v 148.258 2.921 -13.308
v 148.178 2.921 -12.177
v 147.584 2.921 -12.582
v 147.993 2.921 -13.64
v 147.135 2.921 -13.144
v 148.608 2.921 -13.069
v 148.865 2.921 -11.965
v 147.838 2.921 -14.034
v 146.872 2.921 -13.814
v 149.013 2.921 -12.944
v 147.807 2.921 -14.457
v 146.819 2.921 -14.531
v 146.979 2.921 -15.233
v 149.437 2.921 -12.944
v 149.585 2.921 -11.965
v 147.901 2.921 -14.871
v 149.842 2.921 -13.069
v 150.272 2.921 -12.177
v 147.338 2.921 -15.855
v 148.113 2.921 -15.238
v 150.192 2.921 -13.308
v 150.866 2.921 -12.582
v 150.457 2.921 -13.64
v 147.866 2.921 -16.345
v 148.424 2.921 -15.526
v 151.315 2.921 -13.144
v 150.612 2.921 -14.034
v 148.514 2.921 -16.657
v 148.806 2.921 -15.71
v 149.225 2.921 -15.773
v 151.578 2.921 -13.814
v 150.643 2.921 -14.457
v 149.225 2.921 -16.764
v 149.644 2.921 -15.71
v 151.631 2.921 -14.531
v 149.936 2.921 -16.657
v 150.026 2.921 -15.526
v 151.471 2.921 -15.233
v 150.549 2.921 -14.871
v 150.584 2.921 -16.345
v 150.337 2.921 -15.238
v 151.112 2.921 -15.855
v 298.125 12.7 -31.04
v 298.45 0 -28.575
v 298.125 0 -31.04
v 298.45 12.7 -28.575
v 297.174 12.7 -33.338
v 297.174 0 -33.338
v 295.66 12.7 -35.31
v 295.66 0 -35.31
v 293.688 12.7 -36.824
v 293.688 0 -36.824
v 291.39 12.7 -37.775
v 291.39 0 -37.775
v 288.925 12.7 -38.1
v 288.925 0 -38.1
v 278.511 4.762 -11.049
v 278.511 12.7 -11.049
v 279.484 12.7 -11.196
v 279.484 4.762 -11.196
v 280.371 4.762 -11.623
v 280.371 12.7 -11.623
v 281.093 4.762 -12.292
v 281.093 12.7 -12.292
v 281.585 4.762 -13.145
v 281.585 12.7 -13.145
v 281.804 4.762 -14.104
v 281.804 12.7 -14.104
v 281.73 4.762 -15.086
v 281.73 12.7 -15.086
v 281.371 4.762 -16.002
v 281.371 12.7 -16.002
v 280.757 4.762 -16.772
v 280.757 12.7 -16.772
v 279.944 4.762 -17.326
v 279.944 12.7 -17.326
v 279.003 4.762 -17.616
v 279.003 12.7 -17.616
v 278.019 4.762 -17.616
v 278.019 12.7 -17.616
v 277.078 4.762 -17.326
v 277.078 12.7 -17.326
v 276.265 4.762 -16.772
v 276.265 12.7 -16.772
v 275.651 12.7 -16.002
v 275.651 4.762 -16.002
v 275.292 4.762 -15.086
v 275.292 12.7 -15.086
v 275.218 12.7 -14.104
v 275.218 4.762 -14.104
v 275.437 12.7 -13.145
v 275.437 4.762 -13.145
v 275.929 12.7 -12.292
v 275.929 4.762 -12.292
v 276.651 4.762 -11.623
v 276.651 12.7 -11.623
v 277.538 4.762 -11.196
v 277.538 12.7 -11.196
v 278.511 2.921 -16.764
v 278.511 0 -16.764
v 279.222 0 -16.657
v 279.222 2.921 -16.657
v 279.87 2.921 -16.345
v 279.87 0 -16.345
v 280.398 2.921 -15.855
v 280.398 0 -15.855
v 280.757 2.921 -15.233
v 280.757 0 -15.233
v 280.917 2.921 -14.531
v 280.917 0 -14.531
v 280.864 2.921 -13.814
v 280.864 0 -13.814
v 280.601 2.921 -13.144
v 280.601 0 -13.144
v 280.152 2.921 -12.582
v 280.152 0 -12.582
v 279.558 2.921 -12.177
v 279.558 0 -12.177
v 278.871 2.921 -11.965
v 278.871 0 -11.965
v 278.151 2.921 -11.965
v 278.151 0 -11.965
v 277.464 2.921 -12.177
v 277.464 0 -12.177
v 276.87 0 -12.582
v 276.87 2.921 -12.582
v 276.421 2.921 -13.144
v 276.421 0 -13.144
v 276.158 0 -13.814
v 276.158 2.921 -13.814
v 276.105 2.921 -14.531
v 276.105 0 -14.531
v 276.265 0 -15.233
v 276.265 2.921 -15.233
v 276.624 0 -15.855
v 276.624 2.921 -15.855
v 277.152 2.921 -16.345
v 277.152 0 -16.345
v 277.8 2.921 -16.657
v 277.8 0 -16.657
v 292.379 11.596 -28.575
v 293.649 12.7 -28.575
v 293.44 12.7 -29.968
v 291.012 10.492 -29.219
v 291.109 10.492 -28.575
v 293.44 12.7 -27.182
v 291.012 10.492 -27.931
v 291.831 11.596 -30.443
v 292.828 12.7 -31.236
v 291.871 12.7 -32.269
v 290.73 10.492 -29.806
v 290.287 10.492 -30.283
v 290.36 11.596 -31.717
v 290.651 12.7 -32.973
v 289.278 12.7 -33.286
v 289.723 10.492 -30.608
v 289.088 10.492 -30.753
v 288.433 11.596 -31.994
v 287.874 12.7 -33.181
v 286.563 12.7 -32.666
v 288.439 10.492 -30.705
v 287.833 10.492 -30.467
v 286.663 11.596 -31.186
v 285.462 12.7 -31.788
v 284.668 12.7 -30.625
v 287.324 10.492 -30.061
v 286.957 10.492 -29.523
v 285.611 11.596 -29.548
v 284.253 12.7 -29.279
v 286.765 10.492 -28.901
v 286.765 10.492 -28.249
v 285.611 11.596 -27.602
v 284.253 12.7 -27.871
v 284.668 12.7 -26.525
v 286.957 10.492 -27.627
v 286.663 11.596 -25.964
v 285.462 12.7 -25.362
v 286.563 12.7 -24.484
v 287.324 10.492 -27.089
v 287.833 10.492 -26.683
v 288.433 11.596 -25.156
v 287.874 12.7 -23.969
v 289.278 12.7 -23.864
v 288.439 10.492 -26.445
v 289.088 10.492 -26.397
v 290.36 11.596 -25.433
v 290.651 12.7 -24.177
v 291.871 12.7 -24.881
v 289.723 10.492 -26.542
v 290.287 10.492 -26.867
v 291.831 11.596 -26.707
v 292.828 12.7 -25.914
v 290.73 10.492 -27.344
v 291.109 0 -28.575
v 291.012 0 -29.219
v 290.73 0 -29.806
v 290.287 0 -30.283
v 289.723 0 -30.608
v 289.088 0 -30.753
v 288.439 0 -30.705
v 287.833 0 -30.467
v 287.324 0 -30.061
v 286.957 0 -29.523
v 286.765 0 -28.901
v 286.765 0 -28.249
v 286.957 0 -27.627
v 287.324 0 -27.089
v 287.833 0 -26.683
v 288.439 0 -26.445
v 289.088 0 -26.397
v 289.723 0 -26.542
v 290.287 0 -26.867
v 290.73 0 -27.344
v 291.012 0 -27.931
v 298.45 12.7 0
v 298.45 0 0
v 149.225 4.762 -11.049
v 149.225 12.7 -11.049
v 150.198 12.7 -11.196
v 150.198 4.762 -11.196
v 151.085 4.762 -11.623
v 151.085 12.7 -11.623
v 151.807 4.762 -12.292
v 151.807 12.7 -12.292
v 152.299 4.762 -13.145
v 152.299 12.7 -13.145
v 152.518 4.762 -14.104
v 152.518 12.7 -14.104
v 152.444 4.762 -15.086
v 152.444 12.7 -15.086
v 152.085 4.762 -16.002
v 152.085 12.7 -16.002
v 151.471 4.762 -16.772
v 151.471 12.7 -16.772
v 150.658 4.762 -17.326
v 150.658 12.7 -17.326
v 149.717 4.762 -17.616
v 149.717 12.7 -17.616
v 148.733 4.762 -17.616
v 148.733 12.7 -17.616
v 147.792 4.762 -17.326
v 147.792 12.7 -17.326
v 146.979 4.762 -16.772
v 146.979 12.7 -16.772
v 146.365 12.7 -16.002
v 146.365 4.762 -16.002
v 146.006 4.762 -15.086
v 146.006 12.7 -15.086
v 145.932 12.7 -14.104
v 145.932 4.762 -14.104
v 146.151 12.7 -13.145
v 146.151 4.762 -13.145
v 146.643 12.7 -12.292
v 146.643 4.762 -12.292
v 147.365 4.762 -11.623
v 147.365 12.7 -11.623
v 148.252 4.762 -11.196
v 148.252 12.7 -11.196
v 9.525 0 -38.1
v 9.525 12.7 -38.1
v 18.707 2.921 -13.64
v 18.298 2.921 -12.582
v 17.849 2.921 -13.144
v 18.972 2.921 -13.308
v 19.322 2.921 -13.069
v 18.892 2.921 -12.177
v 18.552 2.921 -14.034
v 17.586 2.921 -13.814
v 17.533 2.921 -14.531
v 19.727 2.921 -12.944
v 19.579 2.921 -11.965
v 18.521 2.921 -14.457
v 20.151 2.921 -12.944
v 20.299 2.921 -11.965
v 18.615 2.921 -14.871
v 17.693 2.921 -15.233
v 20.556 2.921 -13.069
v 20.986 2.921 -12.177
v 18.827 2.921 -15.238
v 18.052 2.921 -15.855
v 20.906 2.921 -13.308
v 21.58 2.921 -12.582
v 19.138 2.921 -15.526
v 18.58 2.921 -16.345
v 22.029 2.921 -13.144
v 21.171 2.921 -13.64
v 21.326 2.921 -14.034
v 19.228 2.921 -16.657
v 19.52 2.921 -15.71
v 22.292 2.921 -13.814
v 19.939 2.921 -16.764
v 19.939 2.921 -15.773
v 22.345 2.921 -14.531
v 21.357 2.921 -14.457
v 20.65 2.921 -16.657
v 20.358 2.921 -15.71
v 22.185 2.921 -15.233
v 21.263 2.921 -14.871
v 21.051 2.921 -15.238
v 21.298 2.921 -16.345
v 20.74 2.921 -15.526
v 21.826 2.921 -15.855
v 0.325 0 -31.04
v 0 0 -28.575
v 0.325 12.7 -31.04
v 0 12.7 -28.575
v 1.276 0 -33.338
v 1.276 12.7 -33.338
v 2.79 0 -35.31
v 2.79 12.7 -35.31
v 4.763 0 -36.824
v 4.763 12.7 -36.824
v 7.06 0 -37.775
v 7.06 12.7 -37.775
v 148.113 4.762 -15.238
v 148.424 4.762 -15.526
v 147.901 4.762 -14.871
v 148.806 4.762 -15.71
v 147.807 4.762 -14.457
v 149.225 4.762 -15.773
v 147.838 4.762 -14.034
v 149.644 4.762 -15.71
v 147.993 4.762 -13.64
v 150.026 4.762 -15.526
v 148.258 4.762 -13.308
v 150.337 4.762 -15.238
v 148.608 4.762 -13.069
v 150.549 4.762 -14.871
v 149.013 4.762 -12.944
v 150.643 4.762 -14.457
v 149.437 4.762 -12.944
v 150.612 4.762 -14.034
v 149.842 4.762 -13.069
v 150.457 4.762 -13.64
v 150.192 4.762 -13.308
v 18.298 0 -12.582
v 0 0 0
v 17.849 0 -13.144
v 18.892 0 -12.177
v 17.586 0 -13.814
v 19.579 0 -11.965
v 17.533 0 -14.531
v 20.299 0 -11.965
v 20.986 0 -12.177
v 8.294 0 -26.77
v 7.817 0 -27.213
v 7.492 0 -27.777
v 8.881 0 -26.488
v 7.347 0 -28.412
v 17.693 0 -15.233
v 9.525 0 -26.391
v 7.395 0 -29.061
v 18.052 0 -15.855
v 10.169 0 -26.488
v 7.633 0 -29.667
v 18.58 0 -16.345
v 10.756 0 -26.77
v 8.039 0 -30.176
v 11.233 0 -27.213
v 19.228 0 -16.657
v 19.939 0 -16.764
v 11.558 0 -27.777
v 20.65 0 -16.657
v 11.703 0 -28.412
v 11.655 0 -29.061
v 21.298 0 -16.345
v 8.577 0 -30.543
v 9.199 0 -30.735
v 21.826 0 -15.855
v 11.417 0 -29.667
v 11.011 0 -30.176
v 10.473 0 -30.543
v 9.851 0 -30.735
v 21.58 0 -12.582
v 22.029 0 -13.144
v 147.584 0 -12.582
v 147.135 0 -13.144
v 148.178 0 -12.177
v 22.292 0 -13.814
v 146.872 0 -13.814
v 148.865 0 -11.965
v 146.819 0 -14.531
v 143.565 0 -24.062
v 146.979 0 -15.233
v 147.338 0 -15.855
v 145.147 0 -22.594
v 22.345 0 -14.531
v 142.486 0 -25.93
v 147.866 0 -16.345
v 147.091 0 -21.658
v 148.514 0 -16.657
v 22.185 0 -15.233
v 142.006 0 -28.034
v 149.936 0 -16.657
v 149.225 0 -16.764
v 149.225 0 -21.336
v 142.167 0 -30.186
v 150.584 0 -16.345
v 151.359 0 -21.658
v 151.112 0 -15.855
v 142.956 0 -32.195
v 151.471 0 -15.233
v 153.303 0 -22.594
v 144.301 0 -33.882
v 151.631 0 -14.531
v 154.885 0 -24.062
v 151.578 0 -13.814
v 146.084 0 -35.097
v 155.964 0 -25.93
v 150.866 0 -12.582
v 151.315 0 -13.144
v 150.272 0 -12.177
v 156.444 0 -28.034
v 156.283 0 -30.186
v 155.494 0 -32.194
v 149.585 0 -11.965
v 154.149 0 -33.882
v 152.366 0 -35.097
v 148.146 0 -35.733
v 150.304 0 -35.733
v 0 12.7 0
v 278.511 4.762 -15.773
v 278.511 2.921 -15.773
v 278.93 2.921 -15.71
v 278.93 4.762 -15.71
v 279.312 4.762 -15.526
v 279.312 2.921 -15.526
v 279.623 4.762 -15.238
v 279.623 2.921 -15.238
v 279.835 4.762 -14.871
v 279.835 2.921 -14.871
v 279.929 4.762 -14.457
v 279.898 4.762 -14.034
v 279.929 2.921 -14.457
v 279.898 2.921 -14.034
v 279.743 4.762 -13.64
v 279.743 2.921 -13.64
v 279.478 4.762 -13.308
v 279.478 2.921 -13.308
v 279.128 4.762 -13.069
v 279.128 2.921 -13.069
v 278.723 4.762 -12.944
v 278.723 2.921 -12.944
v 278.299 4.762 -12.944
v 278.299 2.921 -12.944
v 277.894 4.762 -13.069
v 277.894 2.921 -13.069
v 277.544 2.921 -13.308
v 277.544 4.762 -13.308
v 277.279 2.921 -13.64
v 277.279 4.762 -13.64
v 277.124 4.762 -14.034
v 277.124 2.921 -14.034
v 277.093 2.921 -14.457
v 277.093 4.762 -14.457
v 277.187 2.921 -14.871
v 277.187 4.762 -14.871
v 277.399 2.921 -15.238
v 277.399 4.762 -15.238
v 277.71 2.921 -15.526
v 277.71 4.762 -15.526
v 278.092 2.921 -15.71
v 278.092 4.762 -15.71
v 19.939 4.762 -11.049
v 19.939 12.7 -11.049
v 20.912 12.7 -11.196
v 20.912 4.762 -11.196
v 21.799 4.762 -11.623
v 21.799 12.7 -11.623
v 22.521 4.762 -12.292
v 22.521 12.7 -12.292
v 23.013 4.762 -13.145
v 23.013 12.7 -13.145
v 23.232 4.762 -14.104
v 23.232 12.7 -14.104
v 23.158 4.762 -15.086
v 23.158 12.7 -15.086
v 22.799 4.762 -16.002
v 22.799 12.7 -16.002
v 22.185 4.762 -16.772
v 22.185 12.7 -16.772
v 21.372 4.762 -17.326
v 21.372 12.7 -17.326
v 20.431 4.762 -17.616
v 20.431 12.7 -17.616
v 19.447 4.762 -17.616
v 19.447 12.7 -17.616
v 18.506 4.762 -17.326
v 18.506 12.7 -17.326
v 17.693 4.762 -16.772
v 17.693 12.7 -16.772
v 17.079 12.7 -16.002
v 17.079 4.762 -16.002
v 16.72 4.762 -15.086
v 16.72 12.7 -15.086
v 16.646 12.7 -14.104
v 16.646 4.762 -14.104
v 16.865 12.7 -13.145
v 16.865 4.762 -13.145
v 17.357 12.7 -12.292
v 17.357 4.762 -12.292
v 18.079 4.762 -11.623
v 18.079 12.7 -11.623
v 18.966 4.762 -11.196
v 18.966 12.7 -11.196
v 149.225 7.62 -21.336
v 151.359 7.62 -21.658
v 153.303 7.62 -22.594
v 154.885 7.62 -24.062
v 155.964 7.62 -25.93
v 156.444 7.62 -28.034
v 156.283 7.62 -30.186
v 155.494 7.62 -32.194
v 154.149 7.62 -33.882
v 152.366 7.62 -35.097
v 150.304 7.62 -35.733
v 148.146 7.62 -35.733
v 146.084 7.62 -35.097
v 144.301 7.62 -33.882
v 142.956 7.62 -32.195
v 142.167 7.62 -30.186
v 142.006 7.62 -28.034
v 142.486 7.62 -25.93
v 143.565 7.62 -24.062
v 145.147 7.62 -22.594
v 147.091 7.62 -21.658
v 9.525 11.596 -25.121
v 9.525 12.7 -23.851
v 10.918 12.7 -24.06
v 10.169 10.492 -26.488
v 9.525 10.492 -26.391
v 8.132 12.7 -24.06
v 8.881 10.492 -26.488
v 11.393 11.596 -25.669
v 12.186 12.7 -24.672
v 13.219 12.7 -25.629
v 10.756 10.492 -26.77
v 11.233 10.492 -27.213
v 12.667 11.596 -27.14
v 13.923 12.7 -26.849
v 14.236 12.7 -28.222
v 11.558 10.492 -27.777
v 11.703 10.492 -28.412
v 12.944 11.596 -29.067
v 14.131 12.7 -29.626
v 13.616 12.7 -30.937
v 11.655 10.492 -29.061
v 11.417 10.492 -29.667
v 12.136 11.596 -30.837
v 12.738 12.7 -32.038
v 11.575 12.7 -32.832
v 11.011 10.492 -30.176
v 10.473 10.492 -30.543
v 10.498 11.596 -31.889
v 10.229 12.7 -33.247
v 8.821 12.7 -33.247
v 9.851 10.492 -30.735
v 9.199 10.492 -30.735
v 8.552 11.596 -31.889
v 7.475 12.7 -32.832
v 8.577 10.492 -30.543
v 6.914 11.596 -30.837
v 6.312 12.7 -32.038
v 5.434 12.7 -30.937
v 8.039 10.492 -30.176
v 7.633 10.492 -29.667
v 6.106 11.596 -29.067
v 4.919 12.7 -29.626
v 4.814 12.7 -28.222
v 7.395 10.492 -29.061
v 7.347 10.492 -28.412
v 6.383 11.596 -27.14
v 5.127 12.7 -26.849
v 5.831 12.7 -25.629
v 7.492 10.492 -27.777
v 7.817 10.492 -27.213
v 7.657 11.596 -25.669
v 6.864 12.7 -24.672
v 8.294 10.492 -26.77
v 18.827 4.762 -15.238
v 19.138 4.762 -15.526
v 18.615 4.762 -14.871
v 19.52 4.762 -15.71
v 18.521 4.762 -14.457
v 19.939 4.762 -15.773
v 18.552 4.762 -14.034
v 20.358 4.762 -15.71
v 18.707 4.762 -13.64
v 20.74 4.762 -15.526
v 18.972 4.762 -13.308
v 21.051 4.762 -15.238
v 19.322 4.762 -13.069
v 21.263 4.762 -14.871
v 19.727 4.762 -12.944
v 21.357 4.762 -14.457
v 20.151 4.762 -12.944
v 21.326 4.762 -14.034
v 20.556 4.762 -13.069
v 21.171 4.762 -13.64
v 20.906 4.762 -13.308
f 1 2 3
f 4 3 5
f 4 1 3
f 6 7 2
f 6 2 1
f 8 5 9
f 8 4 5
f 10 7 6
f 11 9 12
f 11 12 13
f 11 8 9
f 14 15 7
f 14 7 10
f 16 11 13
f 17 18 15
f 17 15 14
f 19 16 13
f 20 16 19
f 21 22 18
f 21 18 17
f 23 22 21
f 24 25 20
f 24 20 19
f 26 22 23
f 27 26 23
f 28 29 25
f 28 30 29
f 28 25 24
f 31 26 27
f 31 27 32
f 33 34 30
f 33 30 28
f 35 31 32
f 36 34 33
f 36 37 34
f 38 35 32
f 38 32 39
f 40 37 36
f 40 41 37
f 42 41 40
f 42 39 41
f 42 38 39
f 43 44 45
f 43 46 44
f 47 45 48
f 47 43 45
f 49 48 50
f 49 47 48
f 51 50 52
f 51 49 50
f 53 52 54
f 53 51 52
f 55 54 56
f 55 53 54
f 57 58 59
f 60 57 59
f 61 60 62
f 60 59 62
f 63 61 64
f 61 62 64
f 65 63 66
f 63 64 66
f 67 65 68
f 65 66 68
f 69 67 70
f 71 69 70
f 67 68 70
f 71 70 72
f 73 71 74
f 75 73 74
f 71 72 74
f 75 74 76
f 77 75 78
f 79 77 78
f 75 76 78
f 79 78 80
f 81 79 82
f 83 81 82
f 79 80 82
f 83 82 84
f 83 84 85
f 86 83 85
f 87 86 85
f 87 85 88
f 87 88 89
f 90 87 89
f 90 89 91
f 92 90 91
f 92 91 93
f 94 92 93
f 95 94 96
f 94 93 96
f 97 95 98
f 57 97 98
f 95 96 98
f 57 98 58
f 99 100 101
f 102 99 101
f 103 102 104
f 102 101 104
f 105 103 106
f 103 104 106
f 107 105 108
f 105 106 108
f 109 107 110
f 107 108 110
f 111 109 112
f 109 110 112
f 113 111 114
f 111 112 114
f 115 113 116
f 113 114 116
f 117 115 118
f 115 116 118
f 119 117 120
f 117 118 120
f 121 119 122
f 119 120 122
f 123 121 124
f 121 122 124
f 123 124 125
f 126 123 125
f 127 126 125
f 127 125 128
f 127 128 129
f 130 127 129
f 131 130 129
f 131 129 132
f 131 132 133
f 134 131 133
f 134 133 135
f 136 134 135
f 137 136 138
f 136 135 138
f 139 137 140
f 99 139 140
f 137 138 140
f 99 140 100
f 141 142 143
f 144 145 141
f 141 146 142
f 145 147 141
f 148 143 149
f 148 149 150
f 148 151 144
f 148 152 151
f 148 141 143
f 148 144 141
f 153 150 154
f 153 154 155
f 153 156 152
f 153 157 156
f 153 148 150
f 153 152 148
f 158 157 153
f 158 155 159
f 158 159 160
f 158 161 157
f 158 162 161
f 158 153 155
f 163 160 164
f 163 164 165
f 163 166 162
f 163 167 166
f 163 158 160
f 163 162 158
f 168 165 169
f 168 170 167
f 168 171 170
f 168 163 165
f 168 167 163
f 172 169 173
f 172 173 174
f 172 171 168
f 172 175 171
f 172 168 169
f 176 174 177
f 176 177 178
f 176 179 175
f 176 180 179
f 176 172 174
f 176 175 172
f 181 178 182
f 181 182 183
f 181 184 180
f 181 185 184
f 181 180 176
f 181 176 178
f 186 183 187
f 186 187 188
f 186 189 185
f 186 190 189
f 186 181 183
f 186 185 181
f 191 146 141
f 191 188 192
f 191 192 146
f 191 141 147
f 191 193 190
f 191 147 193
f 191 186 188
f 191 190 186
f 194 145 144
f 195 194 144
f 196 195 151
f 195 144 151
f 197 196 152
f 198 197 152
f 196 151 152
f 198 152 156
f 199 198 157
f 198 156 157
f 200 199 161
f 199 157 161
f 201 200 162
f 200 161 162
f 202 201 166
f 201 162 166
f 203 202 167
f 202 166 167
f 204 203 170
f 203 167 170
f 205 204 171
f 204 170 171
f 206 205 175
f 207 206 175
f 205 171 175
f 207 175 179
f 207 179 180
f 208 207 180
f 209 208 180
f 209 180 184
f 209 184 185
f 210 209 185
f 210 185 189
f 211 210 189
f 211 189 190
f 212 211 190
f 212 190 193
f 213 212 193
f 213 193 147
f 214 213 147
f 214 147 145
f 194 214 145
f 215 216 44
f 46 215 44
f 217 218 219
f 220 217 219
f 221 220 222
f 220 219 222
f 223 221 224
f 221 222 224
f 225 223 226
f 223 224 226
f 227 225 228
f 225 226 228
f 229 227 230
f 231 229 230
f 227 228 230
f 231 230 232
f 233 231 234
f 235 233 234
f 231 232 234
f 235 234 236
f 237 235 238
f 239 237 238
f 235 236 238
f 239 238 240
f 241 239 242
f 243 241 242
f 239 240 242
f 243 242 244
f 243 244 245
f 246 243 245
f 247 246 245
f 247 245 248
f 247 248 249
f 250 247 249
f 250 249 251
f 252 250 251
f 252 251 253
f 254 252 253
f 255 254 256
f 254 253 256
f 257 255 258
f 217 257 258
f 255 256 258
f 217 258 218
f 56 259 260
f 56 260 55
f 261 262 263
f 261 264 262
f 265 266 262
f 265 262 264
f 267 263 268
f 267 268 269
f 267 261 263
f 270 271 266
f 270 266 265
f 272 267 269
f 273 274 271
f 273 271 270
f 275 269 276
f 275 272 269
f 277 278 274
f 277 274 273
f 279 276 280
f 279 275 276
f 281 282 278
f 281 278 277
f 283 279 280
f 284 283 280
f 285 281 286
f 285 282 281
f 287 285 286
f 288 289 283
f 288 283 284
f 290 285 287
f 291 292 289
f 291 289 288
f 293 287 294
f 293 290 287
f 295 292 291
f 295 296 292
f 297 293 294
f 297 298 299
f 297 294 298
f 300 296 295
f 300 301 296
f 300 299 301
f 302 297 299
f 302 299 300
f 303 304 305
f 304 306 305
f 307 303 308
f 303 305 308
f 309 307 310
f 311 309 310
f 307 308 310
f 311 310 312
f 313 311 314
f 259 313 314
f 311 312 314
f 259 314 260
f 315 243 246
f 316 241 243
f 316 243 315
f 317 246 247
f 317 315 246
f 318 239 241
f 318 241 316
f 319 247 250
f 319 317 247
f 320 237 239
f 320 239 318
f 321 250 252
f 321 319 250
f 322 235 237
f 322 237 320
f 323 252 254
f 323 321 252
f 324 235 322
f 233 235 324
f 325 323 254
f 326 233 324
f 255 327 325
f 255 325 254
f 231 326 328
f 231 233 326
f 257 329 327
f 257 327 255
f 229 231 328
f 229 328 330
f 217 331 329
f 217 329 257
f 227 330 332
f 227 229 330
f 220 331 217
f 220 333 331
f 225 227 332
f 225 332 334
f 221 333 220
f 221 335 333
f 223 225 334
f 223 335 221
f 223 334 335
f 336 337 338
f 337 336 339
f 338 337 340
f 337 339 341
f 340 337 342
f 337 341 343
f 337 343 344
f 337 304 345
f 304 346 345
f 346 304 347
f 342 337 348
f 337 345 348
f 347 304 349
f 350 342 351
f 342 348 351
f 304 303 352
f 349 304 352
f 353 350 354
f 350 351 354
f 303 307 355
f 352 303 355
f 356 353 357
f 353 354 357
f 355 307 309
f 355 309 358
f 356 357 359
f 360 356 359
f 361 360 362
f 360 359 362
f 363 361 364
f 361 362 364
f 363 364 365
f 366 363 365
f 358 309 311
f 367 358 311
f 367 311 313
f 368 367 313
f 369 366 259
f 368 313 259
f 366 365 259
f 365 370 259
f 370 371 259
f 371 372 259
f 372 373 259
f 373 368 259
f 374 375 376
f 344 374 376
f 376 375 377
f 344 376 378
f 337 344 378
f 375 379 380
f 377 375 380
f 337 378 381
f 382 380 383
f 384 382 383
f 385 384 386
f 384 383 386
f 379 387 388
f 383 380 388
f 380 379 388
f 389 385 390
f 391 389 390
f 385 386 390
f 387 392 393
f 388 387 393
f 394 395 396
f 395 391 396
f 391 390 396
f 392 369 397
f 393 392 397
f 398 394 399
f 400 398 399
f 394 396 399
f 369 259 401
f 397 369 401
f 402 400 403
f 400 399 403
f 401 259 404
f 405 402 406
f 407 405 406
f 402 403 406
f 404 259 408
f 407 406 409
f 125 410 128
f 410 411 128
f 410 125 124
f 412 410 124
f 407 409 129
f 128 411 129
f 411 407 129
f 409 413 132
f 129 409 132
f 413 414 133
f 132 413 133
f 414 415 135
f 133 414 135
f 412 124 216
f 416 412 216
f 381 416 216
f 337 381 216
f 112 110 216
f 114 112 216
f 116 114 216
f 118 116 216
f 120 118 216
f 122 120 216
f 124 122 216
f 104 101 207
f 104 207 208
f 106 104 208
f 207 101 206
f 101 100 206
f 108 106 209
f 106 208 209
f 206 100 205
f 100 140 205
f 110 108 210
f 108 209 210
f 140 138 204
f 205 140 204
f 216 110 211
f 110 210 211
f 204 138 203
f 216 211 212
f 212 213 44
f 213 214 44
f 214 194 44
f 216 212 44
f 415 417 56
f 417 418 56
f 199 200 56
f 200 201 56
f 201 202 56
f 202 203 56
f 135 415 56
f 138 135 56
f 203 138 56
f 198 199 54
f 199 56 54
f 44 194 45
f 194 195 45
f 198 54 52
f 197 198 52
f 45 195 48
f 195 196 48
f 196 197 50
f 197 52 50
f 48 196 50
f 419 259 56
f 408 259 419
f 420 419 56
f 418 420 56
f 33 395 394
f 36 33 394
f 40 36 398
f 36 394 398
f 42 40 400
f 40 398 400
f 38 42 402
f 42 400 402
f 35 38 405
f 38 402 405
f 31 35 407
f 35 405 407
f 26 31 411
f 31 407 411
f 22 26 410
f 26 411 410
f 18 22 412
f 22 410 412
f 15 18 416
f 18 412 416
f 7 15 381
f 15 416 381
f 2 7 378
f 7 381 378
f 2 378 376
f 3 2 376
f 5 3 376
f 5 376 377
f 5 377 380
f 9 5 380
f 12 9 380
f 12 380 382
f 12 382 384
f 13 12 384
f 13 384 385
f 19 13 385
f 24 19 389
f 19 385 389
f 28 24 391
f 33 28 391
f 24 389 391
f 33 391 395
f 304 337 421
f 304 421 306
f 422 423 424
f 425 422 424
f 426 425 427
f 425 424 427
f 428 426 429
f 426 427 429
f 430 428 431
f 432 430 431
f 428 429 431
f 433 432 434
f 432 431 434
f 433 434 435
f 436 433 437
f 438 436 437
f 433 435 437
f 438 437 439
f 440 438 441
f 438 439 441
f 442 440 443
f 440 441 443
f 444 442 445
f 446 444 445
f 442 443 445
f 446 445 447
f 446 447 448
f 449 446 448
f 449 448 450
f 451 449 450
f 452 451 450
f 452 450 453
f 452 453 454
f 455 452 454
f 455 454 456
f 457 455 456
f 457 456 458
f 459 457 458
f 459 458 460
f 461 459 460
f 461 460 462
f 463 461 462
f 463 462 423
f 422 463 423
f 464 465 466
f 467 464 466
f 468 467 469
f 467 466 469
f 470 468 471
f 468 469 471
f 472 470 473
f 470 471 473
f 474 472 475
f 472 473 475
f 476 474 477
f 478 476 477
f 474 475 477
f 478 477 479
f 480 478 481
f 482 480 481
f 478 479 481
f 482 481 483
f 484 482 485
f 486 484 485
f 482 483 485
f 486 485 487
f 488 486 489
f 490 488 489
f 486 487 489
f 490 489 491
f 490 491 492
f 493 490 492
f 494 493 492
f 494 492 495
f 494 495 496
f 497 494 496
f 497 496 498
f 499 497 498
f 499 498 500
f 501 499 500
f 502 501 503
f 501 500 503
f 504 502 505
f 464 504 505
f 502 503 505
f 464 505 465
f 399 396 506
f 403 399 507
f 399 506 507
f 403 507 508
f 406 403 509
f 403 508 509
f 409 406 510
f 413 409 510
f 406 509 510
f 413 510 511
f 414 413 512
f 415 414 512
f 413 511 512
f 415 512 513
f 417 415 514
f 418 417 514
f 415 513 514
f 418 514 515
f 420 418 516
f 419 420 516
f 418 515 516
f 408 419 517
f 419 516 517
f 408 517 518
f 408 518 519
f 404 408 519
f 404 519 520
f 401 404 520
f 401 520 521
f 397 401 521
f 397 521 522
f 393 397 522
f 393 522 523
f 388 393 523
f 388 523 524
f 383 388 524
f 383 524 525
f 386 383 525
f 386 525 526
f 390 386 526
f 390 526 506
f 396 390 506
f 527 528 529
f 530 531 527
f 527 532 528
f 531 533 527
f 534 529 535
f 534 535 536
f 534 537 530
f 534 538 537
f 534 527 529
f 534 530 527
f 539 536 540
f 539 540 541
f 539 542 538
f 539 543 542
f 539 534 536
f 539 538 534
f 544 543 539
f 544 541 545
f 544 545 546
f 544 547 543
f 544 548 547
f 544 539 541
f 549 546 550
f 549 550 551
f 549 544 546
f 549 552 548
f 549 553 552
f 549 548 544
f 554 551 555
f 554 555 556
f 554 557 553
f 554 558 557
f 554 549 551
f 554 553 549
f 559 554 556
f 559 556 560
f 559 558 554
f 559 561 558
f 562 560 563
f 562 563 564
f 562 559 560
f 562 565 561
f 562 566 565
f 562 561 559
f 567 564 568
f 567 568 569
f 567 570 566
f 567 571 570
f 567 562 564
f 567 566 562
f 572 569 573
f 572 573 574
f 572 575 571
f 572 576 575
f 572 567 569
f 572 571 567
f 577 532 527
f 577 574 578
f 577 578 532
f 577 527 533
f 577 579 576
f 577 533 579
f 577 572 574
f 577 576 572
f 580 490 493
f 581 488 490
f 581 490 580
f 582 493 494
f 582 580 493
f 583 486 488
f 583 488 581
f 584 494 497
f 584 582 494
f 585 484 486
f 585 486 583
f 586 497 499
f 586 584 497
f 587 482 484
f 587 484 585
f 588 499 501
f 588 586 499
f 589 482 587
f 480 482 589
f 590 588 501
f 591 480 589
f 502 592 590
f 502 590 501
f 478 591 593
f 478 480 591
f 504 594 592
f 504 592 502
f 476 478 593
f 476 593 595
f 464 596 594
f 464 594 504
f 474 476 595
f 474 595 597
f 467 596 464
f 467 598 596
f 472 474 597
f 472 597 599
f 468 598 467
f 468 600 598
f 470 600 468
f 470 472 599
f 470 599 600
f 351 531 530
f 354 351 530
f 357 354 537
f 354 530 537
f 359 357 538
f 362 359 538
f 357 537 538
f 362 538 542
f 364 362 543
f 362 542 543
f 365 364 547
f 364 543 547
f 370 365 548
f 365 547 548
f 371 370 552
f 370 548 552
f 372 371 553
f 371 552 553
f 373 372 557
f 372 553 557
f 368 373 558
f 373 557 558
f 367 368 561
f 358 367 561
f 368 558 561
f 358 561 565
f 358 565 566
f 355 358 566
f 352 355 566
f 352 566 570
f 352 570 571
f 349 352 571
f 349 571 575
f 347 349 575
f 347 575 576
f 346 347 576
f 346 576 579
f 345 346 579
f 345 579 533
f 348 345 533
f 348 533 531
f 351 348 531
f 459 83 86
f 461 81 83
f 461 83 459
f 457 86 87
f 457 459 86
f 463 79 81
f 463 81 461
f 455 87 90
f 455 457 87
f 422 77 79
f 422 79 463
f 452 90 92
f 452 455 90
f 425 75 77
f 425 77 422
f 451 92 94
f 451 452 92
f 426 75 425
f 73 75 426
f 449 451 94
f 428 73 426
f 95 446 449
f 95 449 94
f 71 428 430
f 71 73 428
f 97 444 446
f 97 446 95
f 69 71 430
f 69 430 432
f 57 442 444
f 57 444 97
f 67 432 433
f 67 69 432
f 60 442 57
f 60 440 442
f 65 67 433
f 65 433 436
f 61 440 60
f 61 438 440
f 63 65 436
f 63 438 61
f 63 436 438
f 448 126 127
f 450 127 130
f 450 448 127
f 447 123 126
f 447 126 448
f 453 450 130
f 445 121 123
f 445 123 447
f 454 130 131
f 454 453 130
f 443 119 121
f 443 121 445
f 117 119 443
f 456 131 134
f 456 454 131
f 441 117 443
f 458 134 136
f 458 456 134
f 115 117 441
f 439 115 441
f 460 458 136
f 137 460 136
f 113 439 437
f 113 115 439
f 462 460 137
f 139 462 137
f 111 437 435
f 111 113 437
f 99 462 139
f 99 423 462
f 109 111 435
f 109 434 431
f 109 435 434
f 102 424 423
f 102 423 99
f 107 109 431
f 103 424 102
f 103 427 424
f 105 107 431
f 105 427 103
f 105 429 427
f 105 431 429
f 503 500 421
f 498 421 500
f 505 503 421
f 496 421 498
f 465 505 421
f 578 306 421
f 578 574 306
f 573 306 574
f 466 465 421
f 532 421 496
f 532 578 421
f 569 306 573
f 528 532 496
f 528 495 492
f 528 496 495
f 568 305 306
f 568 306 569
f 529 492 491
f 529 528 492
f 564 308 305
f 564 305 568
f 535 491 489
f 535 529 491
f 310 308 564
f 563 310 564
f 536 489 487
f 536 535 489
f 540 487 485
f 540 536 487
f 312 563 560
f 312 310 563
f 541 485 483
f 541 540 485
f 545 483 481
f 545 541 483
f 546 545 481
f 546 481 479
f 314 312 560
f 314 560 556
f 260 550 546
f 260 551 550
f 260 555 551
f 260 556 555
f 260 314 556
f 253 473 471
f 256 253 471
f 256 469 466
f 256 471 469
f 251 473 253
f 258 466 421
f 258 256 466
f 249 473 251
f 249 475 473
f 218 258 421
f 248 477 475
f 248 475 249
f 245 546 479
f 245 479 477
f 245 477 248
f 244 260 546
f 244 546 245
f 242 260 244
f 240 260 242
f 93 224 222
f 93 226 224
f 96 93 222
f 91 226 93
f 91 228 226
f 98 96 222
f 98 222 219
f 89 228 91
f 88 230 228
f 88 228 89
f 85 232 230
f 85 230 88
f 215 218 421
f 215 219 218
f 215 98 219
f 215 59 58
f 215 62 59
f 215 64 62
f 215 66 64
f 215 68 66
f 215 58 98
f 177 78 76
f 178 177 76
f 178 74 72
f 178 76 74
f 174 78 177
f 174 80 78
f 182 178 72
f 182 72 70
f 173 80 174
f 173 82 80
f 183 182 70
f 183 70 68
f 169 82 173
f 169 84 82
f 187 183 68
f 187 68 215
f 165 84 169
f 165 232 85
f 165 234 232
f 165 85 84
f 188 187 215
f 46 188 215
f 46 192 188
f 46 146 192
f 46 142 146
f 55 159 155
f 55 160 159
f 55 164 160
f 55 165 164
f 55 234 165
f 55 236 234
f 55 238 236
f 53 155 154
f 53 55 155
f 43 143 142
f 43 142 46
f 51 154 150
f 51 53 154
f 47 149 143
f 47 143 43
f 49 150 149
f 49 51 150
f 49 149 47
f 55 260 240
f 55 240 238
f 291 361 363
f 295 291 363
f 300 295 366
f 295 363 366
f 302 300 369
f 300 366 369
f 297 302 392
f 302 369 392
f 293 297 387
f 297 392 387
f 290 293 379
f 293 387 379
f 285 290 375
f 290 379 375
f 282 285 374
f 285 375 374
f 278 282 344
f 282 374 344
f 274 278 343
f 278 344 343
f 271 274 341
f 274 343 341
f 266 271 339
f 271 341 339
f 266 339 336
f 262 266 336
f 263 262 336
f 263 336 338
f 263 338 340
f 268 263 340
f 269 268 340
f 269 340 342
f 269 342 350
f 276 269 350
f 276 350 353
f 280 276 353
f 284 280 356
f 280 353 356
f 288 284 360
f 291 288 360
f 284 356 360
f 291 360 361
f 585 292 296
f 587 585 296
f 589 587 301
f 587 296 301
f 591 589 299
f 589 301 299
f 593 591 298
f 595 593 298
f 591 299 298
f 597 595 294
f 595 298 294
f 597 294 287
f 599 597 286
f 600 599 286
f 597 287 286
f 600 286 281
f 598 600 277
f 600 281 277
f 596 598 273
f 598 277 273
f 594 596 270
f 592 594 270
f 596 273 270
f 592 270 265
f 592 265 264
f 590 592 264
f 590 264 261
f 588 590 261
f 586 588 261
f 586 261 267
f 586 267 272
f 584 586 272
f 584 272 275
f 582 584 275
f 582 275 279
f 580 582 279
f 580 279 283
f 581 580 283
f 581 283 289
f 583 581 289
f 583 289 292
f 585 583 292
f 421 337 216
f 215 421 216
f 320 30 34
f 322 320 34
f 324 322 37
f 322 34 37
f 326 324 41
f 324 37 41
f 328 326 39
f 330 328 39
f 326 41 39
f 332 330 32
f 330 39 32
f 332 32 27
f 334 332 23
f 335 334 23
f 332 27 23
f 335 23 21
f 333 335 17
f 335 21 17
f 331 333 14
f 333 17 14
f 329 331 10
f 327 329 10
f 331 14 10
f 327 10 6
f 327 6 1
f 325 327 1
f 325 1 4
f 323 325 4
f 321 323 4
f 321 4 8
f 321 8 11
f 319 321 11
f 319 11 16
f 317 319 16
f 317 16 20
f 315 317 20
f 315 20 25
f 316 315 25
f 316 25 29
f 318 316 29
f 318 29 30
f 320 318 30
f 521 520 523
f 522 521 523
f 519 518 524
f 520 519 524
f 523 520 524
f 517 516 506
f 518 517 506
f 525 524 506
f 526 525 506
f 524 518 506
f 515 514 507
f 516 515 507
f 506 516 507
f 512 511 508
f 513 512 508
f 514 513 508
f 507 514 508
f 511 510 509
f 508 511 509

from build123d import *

# Parameters (mm, degrees)
SKETCH1_W           = 298.45
SKETCH1_H           = 38.1
BOSS_EXTRUDE1_DEPTH = 12.7
FILLET1_R           = 9.525
SKETCH2_R           = 3.302
CUT_EXTRUDE1_DEPTH  = 7.9375
SKETCH4_R           = 1.4224
CUT_EXTRUDE2_DEPTH  = 302.140004815
SKETCH5_R           = 2.413
CUT_EXTRUDE3_DEPTH  = 2.921
SKETCH6_R           = 2.1844
CUT_EXTRUDE4_DEPTH  = 302.140004815
CHAMFER1_SIZE       = 2.54
CHAMFER1_SIZE2      = 2.207988314
CUT_EXTRUDE5_START  = -5.08
SKETCH7_R           = 7.239
CUT_EXTRUDE5_DEPTH  = 297.060004815


with BuildPart() as part:
    # Sketch1 → Boss-Extrude1 (new body)
    with BuildSketch(Plane(origin=(0, 0, 0), x_dir=(1, 0, 0), z_dir=(0, 1, 0))):
        with Locations((149.225, 19.05)):
            Rectangle(SKETCH1_W, SKETCH1_H)
    extrude(amount=BOSS_EXTRUDE1_DEPTH)

    # Fillet1
    fillet1_edges = [part.edges().sort_by_distance(p)[0] for p in [
        (0, 6.35, -38.1),
        (298.45, 6.35, -38.1),
    ]]
    fillet(fillet1_edges, radius=FILLET1_R)

    # Sketch2 → Cut-Extrude1 (cut)
    with BuildSketch(Plane(origin=(0, 12.7, 0), x_dir=(1, 0, 0), z_dir=(0, 1, 0))):
        with Locations(Location((19.939, 14.351, 0), (0, 0, 270))):
            Circle(SKETCH2_R)
        with Locations(Location((149.225, 14.351, 0), (0, 0, 270))):
            Circle(SKETCH2_R)
        with Locations(Location((278.511, 14.351, 0), (0, 0, 270))):
            Circle(SKETCH2_R)
    extrude(amount=-CUT_EXTRUDE1_DEPTH, mode=Mode.SUBTRACT)

    # Sketch4 → Cut-Extrude2 (cut, through all)
    with BuildSketch(Plane.XZ):
        with Locations(Location((19.939, -14.351, 0), (0, 0, 270))):
            Circle(SKETCH4_R)
        with Locations(Location((149.225, -14.351, 0), (0, 0, 270))):
            Circle(SKETCH4_R)
        with Locations(Location((278.511, -14.351, 0), (0, 0, 270))):
            Circle(SKETCH4_R)
    extrude(amount=-CUT_EXTRUDE2_DEPTH, mode=Mode.SUBTRACT)

    # Sketch5 → Cut-Extrude3 (cut)
    with BuildSketch(Plane.XZ):
        with Locations(Location((19.939, -14.351, 0), (0, 0, 270))):
            Circle(SKETCH5_R)
        with Locations(Location((149.225, -14.351, 0), (0, 0, 270))):
            Circle(SKETCH5_R)
        with Locations(Location((278.511, -14.351, 0), (0, 0, 270))):
            Circle(SKETCH5_R)
    extrude(amount=-CUT_EXTRUDE3_DEPTH, mode=Mode.SUBTRACT)

    # Sketch6 → Cut-Extrude4 (cut, through all)
    with BuildSketch(Plane(origin=(0, 12.7, 0), x_dir=(1, 0, 0), z_dir=(0, 1, 0))):
        with BuildLine():
            ThreePointArc((286.7406, 28.575), (288.925, 26.3906), (291.1094, 28.575))
            Line((291.1094, 28.575), (286.7406, 28.575))
        make_face()
        with BuildLine():
            Line((286.7406, 28.575), (291.1094, 28.575))
            ThreePointArc((291.1094, 28.575), (288.925, 30.7594), (286.7406, 28.575))
        make_face()
        with Locations(Location((9.525, 28.575, 0), (0, 0, 270))):
            Circle(SKETCH6_R)
    extrude(amount=-CUT_EXTRUDE4_DEPTH, mode=Mode.SUBTRACT)

    # Chamfer1
    chamfer1_edges = [part.edges().sort_by_distance(p)[0] for p in [
        (291.1094, 12.7, -28.575),
        (9.525, 12.7, -30.7594),
    ]]
    chamfer1_side = [part.faces().sort_by_distance(p)[0] for p in [
        (149.225, 12.7, -19.008778326),
    ]]
    chamfer(chamfer1_edges, length=CHAMFER1_SIZE, length2=CHAMFER1_SIZE2, reference=chamfer1_side[0])

    # Sketch7 → Cut-Extrude5 (cut, through all)
    with BuildSketch(Plane(origin=(0, 12.7, 0), x_dir=(1, 0, 0), z_dir=(0, 1, 0)).offset(CUT_EXTRUDE5_START)):
        with Locations(Location((149.225, 28.575, 0), (0, 0, 270))):
            Circle(SKETCH7_R)
    extrude(amount=-CUT_EXTRUDE5_DEPTH, mode=Mode.SUBTRACT)


solid = part.part
